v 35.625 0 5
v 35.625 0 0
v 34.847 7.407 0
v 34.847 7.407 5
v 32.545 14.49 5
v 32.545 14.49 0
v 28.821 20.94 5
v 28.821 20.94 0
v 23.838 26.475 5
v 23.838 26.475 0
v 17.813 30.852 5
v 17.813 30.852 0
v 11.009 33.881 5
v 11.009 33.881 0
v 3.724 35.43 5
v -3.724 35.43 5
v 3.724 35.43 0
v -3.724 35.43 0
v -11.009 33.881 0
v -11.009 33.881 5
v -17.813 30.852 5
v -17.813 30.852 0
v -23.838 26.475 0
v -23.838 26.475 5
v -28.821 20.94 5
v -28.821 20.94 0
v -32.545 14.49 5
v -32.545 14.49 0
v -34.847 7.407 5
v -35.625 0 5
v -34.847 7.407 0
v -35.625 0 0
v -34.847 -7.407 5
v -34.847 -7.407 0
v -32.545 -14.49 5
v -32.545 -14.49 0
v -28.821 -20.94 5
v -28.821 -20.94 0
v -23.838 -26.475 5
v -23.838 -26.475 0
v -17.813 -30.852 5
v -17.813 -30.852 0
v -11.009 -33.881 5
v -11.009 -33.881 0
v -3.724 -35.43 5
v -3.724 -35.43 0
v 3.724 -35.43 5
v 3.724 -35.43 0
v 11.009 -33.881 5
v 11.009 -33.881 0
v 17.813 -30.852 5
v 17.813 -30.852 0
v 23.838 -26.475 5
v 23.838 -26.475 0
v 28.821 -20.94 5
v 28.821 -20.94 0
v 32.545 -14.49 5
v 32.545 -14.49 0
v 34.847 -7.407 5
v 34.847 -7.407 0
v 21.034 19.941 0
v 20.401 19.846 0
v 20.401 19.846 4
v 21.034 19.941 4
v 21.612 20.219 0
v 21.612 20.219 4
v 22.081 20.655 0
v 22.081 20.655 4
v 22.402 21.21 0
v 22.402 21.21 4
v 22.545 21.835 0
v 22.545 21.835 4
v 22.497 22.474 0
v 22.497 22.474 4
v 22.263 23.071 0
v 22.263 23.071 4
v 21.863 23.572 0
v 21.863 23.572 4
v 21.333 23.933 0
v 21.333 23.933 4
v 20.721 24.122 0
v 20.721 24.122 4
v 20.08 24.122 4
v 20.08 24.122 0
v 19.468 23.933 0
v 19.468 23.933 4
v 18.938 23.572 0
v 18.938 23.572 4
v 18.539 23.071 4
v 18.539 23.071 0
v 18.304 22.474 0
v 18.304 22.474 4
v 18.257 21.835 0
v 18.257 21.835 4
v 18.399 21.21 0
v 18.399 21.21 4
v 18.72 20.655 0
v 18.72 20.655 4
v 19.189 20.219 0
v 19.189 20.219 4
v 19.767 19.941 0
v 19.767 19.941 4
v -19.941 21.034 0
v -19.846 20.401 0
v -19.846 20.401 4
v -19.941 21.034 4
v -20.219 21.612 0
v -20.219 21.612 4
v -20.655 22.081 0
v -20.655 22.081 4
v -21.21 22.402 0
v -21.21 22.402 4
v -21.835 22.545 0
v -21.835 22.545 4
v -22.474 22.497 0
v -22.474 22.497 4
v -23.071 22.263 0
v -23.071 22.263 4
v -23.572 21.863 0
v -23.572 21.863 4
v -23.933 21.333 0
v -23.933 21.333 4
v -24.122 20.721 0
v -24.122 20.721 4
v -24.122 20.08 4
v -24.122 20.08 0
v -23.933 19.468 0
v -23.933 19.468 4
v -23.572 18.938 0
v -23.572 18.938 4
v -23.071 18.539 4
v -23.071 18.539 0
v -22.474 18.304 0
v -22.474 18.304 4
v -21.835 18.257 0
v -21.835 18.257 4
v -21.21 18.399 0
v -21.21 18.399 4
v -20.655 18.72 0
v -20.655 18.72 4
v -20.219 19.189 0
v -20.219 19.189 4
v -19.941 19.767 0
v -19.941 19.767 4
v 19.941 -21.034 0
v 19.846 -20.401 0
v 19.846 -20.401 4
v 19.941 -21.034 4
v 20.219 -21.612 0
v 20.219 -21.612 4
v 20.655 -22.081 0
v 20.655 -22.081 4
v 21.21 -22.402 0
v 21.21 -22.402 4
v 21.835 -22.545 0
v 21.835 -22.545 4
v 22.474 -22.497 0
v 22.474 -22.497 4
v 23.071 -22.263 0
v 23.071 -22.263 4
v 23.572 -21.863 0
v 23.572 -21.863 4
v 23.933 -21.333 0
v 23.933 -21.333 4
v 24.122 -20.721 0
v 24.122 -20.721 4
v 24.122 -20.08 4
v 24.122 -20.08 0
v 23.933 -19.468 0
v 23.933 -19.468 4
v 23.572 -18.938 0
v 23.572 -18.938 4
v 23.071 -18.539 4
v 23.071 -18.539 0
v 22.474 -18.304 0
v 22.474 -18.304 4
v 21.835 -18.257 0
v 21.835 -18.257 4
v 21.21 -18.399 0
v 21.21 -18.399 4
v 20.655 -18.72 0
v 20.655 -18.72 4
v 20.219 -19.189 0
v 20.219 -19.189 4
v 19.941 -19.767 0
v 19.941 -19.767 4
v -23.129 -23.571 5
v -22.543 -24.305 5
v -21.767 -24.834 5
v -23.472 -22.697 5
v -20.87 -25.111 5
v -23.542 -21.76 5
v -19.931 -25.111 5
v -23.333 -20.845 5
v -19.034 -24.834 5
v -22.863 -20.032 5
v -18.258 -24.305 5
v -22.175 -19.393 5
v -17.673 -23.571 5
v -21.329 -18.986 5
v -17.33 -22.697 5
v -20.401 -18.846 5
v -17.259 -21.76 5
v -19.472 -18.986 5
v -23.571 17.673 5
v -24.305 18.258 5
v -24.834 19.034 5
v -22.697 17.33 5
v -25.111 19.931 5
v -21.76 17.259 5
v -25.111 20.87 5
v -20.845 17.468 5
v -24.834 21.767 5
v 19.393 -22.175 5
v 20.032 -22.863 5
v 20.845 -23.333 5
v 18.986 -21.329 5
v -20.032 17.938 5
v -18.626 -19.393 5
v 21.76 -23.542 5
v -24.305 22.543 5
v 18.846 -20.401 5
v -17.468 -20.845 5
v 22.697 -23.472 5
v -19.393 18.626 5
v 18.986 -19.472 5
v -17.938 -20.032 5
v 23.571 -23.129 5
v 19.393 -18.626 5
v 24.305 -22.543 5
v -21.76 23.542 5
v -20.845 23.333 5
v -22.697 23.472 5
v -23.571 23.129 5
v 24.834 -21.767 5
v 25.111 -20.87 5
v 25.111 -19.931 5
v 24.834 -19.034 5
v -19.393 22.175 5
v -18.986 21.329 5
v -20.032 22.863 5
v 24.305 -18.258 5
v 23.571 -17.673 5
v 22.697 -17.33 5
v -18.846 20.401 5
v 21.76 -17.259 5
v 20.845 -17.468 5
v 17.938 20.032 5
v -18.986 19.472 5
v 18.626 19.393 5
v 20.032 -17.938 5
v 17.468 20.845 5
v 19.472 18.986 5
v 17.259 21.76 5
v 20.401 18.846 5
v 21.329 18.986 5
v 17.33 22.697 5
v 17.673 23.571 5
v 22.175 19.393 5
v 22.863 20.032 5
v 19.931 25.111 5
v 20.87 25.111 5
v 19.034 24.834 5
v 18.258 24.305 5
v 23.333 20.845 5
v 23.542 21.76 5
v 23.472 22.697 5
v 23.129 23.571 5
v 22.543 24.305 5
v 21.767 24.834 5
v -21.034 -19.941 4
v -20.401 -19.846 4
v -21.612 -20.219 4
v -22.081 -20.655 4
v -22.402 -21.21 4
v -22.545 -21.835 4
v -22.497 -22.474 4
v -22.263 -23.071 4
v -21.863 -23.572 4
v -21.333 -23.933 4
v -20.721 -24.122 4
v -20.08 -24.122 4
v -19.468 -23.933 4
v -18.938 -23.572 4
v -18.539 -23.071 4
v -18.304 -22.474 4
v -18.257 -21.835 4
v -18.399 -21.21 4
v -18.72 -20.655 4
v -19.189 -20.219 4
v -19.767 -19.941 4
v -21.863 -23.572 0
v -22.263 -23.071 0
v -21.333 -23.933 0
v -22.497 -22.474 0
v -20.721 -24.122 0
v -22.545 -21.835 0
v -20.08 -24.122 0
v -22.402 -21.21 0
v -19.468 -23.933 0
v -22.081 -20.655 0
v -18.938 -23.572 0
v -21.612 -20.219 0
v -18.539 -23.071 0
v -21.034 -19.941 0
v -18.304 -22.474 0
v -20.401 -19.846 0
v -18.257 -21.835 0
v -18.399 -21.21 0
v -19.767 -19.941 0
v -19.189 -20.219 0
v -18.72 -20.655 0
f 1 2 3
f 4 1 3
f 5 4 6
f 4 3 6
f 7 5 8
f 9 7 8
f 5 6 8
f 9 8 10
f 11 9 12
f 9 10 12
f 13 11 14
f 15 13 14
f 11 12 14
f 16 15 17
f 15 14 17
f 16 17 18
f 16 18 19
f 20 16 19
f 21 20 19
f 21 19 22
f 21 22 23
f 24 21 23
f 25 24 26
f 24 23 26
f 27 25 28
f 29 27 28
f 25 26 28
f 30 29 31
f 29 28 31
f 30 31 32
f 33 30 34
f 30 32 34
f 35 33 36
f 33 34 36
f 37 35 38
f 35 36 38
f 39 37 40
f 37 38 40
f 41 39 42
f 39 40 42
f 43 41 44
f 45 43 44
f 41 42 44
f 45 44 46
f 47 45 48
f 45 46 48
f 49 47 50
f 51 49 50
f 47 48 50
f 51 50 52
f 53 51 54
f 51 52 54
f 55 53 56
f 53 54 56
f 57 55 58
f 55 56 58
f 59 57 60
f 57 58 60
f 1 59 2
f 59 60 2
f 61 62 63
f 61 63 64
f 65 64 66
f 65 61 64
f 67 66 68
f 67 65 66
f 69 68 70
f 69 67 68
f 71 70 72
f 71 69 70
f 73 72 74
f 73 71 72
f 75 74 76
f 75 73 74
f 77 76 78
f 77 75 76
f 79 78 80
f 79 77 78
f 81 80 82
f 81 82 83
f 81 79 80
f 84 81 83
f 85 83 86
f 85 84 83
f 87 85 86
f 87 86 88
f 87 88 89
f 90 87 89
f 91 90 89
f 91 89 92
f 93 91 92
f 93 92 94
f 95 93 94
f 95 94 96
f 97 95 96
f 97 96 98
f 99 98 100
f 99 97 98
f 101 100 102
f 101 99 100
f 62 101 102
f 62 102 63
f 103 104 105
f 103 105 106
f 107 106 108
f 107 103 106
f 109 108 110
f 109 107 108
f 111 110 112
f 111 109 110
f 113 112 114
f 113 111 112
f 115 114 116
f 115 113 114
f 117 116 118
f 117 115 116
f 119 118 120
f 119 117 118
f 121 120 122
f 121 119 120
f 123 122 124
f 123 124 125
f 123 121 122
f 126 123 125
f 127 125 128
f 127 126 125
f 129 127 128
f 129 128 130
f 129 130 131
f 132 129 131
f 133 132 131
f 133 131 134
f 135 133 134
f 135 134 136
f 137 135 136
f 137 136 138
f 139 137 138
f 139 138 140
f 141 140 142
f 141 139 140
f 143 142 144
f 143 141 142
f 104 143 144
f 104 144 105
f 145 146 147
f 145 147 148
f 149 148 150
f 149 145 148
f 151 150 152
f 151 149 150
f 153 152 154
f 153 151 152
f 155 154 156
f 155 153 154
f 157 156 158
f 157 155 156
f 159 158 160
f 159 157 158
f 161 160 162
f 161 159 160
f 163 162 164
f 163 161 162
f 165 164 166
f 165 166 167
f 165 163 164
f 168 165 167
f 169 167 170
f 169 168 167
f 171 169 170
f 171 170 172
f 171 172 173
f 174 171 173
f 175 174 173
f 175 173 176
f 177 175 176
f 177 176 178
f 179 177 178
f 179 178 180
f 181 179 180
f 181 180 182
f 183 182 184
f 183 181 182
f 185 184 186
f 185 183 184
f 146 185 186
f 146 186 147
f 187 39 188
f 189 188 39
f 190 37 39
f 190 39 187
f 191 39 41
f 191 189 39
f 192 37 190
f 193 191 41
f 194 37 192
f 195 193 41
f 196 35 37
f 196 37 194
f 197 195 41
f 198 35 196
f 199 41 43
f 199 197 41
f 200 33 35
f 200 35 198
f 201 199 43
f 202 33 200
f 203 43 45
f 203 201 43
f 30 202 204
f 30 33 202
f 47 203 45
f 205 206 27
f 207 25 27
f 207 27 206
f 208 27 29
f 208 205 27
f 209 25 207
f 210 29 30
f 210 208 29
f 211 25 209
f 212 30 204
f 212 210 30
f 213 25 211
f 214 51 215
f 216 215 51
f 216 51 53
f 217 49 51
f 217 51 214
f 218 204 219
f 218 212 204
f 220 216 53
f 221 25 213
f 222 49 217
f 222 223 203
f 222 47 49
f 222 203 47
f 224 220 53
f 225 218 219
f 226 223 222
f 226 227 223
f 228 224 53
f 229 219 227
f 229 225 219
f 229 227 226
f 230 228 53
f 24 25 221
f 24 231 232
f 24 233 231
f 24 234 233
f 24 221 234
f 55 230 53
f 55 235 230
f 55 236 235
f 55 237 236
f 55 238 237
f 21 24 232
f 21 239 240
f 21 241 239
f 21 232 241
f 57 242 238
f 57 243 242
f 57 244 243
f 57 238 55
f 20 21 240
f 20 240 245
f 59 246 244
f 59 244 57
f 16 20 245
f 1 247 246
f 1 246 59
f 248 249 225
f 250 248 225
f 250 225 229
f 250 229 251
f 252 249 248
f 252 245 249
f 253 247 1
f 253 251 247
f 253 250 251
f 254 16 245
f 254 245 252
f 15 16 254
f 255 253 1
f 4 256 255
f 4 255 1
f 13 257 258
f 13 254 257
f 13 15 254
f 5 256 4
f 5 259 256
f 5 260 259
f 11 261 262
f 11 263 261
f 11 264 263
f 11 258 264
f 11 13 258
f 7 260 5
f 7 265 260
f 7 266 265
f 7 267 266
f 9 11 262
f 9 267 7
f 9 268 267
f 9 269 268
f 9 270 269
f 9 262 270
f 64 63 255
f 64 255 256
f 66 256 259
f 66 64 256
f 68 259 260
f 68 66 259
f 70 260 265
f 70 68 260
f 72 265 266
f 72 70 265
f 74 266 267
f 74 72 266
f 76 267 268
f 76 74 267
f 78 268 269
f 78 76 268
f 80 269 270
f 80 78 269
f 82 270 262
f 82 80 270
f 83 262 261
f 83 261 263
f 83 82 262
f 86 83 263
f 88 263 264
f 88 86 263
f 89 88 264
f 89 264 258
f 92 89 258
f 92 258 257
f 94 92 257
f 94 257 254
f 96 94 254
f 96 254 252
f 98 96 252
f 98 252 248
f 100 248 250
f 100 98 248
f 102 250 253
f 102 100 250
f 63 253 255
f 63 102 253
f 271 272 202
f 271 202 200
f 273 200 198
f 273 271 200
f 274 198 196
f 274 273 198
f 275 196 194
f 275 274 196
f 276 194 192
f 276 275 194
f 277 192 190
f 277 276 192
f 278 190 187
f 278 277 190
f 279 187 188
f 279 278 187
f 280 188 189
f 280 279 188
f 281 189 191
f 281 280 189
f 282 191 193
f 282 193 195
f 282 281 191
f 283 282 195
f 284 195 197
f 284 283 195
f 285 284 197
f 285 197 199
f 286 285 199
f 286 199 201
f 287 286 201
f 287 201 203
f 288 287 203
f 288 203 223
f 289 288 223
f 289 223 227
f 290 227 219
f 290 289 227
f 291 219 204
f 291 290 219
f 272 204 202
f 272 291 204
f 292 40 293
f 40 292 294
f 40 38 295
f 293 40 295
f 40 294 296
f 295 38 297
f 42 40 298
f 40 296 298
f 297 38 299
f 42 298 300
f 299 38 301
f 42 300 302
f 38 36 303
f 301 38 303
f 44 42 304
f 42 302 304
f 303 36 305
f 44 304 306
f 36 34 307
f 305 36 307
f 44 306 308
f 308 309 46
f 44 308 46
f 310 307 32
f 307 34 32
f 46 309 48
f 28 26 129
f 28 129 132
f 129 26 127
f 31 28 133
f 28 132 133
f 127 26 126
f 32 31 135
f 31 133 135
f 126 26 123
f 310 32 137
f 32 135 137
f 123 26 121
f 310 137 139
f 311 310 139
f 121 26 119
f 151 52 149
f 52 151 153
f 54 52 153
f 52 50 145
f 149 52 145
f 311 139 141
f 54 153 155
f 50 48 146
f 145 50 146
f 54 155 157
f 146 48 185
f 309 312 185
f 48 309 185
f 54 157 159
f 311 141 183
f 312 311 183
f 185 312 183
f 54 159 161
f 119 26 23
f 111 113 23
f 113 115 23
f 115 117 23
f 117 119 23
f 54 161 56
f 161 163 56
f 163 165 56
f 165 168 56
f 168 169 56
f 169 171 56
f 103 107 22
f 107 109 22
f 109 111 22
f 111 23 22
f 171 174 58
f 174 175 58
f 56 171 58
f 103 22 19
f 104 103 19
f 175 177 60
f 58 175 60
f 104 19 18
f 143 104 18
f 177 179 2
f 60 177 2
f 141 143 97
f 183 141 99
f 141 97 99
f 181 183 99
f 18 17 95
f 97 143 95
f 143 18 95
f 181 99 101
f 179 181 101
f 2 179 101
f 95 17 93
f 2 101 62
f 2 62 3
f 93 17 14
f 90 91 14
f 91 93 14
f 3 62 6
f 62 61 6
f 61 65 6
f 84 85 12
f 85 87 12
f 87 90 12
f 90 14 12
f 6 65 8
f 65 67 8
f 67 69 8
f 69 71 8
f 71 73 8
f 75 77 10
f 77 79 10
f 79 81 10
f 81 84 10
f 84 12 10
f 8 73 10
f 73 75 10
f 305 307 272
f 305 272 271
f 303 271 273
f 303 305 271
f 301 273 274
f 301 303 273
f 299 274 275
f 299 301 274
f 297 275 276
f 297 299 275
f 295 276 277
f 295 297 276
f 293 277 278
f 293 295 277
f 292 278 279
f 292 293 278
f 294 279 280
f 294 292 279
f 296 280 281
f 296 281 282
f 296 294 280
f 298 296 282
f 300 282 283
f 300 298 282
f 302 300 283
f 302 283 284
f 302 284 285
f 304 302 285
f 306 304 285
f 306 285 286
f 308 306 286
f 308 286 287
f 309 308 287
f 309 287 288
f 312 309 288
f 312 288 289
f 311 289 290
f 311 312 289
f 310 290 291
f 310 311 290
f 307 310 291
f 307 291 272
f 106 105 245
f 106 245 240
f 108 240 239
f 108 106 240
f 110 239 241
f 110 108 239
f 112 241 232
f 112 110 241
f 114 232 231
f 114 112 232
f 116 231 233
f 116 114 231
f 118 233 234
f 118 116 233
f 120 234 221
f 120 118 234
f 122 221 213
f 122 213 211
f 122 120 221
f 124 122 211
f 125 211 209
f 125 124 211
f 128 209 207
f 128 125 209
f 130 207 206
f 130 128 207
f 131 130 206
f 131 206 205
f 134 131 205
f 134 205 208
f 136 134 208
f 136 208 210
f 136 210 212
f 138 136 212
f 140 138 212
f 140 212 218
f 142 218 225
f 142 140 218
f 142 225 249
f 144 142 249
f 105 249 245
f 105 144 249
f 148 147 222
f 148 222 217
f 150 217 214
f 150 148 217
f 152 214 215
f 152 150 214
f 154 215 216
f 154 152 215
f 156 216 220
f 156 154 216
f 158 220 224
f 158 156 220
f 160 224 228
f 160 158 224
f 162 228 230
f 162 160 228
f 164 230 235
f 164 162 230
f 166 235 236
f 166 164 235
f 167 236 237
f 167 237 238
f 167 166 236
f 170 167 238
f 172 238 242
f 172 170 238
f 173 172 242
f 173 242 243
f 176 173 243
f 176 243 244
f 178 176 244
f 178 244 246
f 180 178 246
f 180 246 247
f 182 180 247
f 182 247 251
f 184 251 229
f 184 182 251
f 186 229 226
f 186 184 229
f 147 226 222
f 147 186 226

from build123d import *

# Parameters (mm, degrees)
SKETCH_R           = 35.625
PAD_DEPTH          = 5
SKETCH001_R        = 2.15
POCKET_DEPTH       = 5
POLARPATTERN_COUNT = 4
CHAMFER_SIZE       = 1


with BuildPart() as part:
    # Sketch → Pad (new body)
    with BuildSketch(Plane.XY):
        Circle(SKETCH_R)
    extrude(amount=PAD_DEPTH)

    # Sketch001 → Pocket (cut)
    with BuildSketch(Plane.XY):
        with Locations((-21.995853, 20.40055)):
            Circle(SKETCH001_R)
    pocket = extrude(amount=POCKET_DEPTH, mode=Mode.SUBTRACT)

    # PolarPattern: Pocket ×4 about axis
    polarpattern_axis = Axis((0, 0, 0), (0, 0, 1))
    for i in range(1, POLARPATTERN_COUNT):
        add(pocket.rotate(polarpattern_axis, i * 360 / POLARPATTERN_COUNT), mode=Mode.SUBTRACT)

    # Chamfer
    chamfer_edges = [part.edges().sort_by_distance(p)[0] for p in [
        (24.145853, -20.40055, 5),
        (20.40055, 24.145853, 5),
        (-24.145853, 20.40055, 5),
        (-20.40055, -24.145853, 5),
    ]]
    chamfer(chamfer_edges, length=CHAMFER_SIZE)


solid = part.part
